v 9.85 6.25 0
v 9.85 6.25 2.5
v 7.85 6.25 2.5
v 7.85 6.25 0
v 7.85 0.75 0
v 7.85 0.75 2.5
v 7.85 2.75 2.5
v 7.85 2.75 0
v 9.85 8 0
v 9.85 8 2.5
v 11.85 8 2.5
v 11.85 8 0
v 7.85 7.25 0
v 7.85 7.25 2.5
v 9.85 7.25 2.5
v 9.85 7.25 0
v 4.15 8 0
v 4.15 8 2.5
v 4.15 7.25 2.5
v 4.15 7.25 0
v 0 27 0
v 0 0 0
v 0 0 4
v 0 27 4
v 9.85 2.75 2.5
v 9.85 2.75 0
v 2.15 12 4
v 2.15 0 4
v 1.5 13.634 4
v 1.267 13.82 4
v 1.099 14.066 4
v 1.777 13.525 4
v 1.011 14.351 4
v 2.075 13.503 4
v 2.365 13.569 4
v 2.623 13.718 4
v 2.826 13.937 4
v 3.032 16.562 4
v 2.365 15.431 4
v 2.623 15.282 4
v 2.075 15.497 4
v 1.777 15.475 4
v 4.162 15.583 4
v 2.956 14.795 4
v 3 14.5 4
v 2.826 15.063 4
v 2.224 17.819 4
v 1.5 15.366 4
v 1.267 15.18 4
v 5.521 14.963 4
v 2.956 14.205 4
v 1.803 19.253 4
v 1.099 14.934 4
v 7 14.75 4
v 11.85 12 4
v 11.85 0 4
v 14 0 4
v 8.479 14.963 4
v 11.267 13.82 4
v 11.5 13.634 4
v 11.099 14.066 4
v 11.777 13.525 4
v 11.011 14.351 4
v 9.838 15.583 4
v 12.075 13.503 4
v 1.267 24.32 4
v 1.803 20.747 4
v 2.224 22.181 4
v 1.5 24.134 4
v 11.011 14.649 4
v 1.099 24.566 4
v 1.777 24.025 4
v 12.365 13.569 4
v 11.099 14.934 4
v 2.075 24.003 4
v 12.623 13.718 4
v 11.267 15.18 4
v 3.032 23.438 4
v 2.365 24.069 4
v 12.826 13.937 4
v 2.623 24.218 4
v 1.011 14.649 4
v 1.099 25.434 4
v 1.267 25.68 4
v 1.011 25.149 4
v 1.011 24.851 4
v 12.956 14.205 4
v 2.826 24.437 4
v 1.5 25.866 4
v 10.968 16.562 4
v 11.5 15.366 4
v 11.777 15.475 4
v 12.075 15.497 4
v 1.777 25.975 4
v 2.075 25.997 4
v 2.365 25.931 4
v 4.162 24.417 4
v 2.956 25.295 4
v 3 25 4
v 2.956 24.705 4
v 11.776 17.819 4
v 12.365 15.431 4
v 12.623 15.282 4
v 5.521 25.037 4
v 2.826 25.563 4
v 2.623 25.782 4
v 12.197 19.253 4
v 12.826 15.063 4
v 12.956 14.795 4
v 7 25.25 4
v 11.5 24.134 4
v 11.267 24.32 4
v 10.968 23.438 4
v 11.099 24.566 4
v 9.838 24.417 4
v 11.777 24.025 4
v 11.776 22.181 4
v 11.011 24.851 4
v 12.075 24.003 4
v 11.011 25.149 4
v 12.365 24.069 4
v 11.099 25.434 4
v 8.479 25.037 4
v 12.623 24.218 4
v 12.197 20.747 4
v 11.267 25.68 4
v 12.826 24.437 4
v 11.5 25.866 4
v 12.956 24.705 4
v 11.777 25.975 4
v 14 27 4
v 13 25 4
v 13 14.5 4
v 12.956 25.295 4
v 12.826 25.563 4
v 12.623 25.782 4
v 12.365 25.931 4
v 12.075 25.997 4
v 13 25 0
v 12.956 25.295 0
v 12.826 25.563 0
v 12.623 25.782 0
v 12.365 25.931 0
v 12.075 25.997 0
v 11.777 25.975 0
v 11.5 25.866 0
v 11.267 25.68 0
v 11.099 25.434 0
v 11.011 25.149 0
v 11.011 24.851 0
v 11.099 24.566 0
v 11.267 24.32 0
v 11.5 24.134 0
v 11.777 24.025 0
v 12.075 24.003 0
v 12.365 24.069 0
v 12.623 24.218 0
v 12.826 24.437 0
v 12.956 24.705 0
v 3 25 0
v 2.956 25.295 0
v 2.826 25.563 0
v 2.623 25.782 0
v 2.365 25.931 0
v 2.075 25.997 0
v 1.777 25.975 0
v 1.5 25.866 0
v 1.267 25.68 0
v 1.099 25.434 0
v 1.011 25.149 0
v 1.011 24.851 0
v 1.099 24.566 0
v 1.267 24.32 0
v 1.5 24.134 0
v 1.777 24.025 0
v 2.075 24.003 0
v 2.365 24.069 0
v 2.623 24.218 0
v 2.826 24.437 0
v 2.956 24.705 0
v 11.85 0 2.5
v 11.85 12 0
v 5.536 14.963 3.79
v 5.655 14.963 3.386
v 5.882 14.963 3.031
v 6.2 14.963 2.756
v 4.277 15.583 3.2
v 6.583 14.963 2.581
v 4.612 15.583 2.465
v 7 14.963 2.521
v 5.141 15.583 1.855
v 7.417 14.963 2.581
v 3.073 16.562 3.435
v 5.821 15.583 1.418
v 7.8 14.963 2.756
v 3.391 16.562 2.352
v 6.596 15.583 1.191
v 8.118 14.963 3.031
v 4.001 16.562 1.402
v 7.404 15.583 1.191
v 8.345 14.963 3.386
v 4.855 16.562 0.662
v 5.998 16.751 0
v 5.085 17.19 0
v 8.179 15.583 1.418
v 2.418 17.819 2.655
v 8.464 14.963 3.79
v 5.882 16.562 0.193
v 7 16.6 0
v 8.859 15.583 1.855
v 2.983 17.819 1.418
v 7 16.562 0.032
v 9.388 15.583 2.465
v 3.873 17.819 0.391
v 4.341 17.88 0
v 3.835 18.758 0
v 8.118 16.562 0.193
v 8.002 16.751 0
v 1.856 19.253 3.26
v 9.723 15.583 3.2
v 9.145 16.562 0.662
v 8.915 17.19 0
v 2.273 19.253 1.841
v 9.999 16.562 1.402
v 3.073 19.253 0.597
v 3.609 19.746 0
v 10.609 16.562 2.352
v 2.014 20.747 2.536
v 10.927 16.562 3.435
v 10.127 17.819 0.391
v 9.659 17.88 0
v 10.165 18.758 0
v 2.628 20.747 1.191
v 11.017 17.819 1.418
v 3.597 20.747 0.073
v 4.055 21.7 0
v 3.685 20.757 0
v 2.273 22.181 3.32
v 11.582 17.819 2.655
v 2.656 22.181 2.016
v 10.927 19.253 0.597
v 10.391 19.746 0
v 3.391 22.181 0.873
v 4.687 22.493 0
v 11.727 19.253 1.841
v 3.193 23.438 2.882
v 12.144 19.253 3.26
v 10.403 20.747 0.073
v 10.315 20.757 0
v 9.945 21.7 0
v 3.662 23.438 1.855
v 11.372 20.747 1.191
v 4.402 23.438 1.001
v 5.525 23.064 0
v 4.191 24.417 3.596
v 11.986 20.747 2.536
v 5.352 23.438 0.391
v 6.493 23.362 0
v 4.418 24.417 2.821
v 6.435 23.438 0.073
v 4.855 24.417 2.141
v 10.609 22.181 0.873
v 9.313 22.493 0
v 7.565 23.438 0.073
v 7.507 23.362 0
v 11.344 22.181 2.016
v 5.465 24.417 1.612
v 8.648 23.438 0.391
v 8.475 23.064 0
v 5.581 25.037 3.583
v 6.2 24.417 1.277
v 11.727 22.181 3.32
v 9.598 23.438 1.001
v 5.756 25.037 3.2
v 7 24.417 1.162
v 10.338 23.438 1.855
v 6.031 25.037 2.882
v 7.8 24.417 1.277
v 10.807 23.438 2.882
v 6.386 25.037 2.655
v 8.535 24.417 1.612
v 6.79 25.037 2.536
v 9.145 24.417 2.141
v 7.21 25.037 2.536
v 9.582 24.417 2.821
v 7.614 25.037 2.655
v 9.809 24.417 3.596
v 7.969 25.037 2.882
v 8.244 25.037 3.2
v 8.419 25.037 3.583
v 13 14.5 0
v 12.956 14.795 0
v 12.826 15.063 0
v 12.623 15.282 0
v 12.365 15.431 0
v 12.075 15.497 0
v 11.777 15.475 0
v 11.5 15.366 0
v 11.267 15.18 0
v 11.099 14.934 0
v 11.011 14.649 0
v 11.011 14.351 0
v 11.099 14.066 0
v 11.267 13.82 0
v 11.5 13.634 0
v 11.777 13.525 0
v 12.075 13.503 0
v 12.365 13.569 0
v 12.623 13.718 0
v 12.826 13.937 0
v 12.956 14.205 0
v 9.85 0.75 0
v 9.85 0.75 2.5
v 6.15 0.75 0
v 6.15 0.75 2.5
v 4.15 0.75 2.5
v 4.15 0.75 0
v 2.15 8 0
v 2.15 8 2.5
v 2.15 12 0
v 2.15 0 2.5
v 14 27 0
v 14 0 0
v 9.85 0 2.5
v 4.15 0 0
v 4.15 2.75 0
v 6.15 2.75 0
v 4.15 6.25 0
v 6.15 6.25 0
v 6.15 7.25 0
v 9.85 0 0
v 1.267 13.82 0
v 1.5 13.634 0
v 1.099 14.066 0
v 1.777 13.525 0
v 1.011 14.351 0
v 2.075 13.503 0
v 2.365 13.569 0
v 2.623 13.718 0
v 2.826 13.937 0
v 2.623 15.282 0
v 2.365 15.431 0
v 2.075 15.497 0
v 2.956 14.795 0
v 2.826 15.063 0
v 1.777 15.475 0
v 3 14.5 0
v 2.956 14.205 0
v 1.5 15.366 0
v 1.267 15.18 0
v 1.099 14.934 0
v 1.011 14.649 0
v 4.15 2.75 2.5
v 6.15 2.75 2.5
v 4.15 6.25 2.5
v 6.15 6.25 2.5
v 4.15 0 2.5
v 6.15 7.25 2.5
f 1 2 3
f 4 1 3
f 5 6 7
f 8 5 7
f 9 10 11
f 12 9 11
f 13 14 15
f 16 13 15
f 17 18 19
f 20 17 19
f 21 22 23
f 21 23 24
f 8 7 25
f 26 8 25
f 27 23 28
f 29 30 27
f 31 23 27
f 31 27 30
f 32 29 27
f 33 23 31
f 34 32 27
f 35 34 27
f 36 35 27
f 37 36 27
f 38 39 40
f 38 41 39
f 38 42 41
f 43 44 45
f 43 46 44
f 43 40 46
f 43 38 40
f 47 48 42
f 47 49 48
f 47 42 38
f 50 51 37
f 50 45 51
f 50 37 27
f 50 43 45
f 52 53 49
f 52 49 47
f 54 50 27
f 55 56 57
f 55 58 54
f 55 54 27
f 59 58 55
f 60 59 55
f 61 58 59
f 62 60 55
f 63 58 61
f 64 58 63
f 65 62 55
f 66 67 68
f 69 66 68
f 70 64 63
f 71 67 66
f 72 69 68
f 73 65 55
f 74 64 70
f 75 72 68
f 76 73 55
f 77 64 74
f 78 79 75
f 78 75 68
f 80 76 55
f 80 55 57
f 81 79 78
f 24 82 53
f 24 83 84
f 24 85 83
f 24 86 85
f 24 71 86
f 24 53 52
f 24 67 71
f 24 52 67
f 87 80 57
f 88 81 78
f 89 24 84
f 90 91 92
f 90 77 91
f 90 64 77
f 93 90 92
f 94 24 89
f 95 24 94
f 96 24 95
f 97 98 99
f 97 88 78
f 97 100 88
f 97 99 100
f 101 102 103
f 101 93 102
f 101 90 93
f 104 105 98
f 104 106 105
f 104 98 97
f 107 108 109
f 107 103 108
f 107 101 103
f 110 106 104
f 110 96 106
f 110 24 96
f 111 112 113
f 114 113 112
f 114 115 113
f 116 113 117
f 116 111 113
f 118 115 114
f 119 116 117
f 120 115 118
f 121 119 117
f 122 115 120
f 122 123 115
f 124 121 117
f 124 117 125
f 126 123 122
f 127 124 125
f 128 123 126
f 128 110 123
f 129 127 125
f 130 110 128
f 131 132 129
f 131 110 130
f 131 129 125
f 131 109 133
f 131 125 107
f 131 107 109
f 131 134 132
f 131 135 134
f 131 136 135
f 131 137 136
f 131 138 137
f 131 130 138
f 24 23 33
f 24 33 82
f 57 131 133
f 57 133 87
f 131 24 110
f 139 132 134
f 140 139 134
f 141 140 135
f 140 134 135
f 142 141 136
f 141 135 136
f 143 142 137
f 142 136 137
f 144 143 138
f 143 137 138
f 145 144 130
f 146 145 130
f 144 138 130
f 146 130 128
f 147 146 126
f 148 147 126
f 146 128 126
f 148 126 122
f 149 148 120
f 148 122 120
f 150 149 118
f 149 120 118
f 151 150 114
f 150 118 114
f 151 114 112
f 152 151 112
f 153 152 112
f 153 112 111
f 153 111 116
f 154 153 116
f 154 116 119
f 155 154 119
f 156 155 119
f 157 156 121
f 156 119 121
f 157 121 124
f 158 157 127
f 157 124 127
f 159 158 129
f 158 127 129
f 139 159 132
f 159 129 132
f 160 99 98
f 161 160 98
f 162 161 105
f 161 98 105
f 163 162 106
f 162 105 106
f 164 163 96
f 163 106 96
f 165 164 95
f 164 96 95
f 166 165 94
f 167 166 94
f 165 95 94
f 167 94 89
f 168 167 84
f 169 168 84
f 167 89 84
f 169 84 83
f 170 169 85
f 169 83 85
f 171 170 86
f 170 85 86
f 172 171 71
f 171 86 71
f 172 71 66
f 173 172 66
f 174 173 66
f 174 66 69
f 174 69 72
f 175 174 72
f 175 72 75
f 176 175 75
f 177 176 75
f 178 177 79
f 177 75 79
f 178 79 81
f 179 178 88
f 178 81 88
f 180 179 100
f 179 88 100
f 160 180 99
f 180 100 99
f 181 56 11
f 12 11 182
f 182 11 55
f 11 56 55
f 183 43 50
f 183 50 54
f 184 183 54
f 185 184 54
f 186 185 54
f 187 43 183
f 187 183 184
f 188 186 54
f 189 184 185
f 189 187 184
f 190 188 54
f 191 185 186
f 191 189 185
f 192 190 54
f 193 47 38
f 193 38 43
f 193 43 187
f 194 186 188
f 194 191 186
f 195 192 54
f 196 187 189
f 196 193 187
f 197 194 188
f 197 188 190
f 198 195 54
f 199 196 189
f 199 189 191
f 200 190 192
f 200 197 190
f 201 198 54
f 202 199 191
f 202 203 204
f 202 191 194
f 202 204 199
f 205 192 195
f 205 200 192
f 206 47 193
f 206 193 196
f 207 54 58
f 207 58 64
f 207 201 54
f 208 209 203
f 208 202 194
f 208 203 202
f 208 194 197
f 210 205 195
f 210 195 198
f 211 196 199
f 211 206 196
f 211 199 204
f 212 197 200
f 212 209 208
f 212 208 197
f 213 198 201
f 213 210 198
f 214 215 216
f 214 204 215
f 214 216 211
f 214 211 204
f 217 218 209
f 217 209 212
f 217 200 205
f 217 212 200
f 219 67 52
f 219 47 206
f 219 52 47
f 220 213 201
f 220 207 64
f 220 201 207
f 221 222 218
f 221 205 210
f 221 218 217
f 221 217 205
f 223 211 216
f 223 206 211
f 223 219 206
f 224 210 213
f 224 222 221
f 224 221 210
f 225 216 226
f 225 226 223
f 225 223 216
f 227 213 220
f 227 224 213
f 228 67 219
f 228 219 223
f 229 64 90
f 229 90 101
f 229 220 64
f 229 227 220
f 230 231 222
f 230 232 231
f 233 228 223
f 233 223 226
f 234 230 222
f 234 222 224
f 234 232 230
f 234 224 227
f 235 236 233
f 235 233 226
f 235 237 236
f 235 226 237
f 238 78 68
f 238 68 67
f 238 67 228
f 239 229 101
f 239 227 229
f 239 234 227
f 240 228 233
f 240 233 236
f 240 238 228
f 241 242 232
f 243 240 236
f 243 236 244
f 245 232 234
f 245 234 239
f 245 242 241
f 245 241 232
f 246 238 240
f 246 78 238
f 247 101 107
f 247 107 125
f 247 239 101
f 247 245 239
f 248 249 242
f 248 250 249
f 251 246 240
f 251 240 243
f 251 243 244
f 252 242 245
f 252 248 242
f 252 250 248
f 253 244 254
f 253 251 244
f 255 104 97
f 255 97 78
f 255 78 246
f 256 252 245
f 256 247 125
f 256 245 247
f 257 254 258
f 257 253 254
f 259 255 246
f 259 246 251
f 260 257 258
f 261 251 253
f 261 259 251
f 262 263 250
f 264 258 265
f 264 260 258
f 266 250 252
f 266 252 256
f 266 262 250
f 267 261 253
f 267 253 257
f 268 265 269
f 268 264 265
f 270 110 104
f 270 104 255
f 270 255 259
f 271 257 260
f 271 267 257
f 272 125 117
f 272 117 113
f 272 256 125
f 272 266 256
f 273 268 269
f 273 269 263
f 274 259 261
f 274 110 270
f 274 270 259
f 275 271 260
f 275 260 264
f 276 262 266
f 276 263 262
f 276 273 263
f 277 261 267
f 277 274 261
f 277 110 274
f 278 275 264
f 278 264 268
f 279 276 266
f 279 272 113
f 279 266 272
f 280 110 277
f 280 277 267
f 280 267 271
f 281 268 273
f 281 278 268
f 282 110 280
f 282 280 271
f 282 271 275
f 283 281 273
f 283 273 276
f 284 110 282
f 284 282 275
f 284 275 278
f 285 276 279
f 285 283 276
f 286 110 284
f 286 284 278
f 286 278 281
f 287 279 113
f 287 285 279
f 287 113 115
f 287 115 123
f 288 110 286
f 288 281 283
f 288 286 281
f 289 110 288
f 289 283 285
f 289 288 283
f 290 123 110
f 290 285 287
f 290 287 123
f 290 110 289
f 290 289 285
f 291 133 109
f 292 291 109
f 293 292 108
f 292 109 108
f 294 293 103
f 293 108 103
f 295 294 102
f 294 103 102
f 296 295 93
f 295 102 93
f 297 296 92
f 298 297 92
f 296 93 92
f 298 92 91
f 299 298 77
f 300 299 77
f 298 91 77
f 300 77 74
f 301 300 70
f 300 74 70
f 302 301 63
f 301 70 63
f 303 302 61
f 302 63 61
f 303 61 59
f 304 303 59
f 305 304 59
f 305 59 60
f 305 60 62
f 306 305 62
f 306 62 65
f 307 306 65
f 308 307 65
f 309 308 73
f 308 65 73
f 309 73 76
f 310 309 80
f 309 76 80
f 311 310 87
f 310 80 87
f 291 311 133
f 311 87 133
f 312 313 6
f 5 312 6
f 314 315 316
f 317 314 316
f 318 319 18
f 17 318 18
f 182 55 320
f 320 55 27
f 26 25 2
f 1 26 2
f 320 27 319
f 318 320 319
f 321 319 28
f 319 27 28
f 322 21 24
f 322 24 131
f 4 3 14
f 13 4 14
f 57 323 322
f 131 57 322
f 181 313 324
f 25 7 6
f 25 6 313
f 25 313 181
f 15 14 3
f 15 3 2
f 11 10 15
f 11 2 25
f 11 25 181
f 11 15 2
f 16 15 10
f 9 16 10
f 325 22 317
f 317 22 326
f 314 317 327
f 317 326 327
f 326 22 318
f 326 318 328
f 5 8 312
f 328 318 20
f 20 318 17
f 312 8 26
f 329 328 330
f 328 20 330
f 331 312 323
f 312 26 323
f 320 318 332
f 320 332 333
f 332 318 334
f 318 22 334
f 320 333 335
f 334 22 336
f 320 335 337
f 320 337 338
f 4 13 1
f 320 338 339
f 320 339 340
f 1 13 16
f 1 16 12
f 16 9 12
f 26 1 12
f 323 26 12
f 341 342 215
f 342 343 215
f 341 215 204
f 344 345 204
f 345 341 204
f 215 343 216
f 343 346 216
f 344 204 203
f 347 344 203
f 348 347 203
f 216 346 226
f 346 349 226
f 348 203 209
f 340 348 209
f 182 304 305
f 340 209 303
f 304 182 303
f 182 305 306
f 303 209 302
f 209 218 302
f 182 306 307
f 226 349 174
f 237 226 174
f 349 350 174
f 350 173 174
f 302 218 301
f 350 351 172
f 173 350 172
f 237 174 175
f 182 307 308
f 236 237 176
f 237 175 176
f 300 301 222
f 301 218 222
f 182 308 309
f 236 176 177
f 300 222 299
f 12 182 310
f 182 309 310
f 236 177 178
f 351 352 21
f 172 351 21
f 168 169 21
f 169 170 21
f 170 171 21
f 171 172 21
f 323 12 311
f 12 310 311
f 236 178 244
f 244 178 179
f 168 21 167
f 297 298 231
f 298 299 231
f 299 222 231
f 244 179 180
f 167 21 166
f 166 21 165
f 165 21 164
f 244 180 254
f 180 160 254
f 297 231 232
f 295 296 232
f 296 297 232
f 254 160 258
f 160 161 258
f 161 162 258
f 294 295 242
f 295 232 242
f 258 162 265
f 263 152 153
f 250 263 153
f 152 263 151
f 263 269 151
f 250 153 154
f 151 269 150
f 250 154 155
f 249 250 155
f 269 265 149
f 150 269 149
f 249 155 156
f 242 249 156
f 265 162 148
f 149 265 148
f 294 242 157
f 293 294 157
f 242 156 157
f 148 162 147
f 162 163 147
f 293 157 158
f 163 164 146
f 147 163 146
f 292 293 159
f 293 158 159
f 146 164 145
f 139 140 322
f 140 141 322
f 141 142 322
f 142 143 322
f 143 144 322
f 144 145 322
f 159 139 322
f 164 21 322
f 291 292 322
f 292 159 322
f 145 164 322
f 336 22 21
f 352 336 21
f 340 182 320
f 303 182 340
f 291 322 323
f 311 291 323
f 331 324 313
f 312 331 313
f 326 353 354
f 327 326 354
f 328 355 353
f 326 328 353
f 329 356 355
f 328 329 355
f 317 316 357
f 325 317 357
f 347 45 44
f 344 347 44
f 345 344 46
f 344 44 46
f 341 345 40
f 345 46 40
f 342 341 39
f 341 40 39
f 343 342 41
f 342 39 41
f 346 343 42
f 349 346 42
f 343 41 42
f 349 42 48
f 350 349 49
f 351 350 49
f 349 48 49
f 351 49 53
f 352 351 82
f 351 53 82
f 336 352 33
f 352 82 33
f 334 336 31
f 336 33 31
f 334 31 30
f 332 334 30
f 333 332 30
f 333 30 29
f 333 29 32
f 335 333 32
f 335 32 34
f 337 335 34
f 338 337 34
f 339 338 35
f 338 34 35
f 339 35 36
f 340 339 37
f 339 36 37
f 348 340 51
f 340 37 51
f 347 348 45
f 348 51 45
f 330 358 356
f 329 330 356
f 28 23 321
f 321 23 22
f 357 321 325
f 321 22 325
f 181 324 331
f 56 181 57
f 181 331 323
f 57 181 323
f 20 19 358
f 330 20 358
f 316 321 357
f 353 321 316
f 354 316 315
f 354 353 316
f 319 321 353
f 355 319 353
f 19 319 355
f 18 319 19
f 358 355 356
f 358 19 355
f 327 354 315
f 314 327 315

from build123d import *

# Parameters (mm, degrees)
F0_W     = 14
F0_H     = 27
F1_DEPTH = 4
F2_R     = 1
F4_DEPTH = 4
F5_DEPTH = 4
F6_DEPTH = 1.5


with BuildPart() as f1:
    # F0 (on Top) → F1 (new body)
    with BuildSketch(Plane.XY):
        with Locations((7, 13.5)):
            Rectangle(F0_W, F0_H)
    extrude(amount=F1_DEPTH)

    # F2 (on face) → F3 (revolve, cut)
    with BuildSketch(Plane.XY.offset(4)):
        with BuildLine():
            ThreePointArc((7, 14.75), (12.25, 20), (7, 25.25))
            Line((7, 25.25), (7, 14.75))
        make_face()
    revolve(axis=Axis((7, 20, 4), (0, -1, 0)), mode=Mode.SUBTRACT)

    # F2 (on face) → F4 (cut)
    with BuildSketch(Plane.XY.offset(4)):
        with Locations((2, 25)):
            Circle(F2_R)
        with Locations((12, 14.5)):
            Circle(F2_R)
        with Locations((12, 25)):
            Circle(F2_R)
        with Locations((2, 14.5)):
            Circle(F2_R)
    extrude(amount=-F4_DEPTH, mode=Mode.SUBTRACT)

    # F2 (on face) → F5 (cut)
    with BuildSketch(Plane.XY.offset(4)):
        Polygon((2.15, 12), (2.15, 8), (4.15, 8), (4.15, 7.25), (6.15, 7.25), (6.15, 6.25), (4.15, 6.25), (4.15, 2.75), (6.15, 2.75), (6.15, 0.75), (4.15, 0.75), (4.15, 0), (9.85, 0), (9.85, 0.75), (7.85, 0.75), (7.85, 2.75), (9.85, 2.75), (9.85, 6.25), (7.85, 6.25), (7.85, 7.25), (9.85, 7.25), (9.85, 8), (11.85, 8), (11.85, 12), align=None)
    extrude(amount=-F5_DEPTH, mode=Mode.SUBTRACT)

    # F2 (on face) → F6 (cut)
    with BuildSketch(Plane.XY.offset(4)):
        Polygon((2.15, 8), (2.15, 0), (4.15, 0), (4.15, 0.75), (6.15, 0.75), (6.15, 2.75), (4.15, 2.75), (4.15, 6.25), (6.15, 6.25), (6.15, 7.25), (4.15, 7.25), (4.15, 8), align=None)
        Polygon((9.85, 0.75), (9.85, 0), (11.85, 0), (11.85, 8), (9.85, 8), (9.85, 7.25), (7.85, 7.25), (7.85, 6.25), (9.85, 6.25), (9.85, 2.75), (7.85, 2.75), (7.85, 0.75), align=None)
    extrude(amount=-F6_DEPTH, mode=Mode.SUBTRACT)


solid = f1.part
